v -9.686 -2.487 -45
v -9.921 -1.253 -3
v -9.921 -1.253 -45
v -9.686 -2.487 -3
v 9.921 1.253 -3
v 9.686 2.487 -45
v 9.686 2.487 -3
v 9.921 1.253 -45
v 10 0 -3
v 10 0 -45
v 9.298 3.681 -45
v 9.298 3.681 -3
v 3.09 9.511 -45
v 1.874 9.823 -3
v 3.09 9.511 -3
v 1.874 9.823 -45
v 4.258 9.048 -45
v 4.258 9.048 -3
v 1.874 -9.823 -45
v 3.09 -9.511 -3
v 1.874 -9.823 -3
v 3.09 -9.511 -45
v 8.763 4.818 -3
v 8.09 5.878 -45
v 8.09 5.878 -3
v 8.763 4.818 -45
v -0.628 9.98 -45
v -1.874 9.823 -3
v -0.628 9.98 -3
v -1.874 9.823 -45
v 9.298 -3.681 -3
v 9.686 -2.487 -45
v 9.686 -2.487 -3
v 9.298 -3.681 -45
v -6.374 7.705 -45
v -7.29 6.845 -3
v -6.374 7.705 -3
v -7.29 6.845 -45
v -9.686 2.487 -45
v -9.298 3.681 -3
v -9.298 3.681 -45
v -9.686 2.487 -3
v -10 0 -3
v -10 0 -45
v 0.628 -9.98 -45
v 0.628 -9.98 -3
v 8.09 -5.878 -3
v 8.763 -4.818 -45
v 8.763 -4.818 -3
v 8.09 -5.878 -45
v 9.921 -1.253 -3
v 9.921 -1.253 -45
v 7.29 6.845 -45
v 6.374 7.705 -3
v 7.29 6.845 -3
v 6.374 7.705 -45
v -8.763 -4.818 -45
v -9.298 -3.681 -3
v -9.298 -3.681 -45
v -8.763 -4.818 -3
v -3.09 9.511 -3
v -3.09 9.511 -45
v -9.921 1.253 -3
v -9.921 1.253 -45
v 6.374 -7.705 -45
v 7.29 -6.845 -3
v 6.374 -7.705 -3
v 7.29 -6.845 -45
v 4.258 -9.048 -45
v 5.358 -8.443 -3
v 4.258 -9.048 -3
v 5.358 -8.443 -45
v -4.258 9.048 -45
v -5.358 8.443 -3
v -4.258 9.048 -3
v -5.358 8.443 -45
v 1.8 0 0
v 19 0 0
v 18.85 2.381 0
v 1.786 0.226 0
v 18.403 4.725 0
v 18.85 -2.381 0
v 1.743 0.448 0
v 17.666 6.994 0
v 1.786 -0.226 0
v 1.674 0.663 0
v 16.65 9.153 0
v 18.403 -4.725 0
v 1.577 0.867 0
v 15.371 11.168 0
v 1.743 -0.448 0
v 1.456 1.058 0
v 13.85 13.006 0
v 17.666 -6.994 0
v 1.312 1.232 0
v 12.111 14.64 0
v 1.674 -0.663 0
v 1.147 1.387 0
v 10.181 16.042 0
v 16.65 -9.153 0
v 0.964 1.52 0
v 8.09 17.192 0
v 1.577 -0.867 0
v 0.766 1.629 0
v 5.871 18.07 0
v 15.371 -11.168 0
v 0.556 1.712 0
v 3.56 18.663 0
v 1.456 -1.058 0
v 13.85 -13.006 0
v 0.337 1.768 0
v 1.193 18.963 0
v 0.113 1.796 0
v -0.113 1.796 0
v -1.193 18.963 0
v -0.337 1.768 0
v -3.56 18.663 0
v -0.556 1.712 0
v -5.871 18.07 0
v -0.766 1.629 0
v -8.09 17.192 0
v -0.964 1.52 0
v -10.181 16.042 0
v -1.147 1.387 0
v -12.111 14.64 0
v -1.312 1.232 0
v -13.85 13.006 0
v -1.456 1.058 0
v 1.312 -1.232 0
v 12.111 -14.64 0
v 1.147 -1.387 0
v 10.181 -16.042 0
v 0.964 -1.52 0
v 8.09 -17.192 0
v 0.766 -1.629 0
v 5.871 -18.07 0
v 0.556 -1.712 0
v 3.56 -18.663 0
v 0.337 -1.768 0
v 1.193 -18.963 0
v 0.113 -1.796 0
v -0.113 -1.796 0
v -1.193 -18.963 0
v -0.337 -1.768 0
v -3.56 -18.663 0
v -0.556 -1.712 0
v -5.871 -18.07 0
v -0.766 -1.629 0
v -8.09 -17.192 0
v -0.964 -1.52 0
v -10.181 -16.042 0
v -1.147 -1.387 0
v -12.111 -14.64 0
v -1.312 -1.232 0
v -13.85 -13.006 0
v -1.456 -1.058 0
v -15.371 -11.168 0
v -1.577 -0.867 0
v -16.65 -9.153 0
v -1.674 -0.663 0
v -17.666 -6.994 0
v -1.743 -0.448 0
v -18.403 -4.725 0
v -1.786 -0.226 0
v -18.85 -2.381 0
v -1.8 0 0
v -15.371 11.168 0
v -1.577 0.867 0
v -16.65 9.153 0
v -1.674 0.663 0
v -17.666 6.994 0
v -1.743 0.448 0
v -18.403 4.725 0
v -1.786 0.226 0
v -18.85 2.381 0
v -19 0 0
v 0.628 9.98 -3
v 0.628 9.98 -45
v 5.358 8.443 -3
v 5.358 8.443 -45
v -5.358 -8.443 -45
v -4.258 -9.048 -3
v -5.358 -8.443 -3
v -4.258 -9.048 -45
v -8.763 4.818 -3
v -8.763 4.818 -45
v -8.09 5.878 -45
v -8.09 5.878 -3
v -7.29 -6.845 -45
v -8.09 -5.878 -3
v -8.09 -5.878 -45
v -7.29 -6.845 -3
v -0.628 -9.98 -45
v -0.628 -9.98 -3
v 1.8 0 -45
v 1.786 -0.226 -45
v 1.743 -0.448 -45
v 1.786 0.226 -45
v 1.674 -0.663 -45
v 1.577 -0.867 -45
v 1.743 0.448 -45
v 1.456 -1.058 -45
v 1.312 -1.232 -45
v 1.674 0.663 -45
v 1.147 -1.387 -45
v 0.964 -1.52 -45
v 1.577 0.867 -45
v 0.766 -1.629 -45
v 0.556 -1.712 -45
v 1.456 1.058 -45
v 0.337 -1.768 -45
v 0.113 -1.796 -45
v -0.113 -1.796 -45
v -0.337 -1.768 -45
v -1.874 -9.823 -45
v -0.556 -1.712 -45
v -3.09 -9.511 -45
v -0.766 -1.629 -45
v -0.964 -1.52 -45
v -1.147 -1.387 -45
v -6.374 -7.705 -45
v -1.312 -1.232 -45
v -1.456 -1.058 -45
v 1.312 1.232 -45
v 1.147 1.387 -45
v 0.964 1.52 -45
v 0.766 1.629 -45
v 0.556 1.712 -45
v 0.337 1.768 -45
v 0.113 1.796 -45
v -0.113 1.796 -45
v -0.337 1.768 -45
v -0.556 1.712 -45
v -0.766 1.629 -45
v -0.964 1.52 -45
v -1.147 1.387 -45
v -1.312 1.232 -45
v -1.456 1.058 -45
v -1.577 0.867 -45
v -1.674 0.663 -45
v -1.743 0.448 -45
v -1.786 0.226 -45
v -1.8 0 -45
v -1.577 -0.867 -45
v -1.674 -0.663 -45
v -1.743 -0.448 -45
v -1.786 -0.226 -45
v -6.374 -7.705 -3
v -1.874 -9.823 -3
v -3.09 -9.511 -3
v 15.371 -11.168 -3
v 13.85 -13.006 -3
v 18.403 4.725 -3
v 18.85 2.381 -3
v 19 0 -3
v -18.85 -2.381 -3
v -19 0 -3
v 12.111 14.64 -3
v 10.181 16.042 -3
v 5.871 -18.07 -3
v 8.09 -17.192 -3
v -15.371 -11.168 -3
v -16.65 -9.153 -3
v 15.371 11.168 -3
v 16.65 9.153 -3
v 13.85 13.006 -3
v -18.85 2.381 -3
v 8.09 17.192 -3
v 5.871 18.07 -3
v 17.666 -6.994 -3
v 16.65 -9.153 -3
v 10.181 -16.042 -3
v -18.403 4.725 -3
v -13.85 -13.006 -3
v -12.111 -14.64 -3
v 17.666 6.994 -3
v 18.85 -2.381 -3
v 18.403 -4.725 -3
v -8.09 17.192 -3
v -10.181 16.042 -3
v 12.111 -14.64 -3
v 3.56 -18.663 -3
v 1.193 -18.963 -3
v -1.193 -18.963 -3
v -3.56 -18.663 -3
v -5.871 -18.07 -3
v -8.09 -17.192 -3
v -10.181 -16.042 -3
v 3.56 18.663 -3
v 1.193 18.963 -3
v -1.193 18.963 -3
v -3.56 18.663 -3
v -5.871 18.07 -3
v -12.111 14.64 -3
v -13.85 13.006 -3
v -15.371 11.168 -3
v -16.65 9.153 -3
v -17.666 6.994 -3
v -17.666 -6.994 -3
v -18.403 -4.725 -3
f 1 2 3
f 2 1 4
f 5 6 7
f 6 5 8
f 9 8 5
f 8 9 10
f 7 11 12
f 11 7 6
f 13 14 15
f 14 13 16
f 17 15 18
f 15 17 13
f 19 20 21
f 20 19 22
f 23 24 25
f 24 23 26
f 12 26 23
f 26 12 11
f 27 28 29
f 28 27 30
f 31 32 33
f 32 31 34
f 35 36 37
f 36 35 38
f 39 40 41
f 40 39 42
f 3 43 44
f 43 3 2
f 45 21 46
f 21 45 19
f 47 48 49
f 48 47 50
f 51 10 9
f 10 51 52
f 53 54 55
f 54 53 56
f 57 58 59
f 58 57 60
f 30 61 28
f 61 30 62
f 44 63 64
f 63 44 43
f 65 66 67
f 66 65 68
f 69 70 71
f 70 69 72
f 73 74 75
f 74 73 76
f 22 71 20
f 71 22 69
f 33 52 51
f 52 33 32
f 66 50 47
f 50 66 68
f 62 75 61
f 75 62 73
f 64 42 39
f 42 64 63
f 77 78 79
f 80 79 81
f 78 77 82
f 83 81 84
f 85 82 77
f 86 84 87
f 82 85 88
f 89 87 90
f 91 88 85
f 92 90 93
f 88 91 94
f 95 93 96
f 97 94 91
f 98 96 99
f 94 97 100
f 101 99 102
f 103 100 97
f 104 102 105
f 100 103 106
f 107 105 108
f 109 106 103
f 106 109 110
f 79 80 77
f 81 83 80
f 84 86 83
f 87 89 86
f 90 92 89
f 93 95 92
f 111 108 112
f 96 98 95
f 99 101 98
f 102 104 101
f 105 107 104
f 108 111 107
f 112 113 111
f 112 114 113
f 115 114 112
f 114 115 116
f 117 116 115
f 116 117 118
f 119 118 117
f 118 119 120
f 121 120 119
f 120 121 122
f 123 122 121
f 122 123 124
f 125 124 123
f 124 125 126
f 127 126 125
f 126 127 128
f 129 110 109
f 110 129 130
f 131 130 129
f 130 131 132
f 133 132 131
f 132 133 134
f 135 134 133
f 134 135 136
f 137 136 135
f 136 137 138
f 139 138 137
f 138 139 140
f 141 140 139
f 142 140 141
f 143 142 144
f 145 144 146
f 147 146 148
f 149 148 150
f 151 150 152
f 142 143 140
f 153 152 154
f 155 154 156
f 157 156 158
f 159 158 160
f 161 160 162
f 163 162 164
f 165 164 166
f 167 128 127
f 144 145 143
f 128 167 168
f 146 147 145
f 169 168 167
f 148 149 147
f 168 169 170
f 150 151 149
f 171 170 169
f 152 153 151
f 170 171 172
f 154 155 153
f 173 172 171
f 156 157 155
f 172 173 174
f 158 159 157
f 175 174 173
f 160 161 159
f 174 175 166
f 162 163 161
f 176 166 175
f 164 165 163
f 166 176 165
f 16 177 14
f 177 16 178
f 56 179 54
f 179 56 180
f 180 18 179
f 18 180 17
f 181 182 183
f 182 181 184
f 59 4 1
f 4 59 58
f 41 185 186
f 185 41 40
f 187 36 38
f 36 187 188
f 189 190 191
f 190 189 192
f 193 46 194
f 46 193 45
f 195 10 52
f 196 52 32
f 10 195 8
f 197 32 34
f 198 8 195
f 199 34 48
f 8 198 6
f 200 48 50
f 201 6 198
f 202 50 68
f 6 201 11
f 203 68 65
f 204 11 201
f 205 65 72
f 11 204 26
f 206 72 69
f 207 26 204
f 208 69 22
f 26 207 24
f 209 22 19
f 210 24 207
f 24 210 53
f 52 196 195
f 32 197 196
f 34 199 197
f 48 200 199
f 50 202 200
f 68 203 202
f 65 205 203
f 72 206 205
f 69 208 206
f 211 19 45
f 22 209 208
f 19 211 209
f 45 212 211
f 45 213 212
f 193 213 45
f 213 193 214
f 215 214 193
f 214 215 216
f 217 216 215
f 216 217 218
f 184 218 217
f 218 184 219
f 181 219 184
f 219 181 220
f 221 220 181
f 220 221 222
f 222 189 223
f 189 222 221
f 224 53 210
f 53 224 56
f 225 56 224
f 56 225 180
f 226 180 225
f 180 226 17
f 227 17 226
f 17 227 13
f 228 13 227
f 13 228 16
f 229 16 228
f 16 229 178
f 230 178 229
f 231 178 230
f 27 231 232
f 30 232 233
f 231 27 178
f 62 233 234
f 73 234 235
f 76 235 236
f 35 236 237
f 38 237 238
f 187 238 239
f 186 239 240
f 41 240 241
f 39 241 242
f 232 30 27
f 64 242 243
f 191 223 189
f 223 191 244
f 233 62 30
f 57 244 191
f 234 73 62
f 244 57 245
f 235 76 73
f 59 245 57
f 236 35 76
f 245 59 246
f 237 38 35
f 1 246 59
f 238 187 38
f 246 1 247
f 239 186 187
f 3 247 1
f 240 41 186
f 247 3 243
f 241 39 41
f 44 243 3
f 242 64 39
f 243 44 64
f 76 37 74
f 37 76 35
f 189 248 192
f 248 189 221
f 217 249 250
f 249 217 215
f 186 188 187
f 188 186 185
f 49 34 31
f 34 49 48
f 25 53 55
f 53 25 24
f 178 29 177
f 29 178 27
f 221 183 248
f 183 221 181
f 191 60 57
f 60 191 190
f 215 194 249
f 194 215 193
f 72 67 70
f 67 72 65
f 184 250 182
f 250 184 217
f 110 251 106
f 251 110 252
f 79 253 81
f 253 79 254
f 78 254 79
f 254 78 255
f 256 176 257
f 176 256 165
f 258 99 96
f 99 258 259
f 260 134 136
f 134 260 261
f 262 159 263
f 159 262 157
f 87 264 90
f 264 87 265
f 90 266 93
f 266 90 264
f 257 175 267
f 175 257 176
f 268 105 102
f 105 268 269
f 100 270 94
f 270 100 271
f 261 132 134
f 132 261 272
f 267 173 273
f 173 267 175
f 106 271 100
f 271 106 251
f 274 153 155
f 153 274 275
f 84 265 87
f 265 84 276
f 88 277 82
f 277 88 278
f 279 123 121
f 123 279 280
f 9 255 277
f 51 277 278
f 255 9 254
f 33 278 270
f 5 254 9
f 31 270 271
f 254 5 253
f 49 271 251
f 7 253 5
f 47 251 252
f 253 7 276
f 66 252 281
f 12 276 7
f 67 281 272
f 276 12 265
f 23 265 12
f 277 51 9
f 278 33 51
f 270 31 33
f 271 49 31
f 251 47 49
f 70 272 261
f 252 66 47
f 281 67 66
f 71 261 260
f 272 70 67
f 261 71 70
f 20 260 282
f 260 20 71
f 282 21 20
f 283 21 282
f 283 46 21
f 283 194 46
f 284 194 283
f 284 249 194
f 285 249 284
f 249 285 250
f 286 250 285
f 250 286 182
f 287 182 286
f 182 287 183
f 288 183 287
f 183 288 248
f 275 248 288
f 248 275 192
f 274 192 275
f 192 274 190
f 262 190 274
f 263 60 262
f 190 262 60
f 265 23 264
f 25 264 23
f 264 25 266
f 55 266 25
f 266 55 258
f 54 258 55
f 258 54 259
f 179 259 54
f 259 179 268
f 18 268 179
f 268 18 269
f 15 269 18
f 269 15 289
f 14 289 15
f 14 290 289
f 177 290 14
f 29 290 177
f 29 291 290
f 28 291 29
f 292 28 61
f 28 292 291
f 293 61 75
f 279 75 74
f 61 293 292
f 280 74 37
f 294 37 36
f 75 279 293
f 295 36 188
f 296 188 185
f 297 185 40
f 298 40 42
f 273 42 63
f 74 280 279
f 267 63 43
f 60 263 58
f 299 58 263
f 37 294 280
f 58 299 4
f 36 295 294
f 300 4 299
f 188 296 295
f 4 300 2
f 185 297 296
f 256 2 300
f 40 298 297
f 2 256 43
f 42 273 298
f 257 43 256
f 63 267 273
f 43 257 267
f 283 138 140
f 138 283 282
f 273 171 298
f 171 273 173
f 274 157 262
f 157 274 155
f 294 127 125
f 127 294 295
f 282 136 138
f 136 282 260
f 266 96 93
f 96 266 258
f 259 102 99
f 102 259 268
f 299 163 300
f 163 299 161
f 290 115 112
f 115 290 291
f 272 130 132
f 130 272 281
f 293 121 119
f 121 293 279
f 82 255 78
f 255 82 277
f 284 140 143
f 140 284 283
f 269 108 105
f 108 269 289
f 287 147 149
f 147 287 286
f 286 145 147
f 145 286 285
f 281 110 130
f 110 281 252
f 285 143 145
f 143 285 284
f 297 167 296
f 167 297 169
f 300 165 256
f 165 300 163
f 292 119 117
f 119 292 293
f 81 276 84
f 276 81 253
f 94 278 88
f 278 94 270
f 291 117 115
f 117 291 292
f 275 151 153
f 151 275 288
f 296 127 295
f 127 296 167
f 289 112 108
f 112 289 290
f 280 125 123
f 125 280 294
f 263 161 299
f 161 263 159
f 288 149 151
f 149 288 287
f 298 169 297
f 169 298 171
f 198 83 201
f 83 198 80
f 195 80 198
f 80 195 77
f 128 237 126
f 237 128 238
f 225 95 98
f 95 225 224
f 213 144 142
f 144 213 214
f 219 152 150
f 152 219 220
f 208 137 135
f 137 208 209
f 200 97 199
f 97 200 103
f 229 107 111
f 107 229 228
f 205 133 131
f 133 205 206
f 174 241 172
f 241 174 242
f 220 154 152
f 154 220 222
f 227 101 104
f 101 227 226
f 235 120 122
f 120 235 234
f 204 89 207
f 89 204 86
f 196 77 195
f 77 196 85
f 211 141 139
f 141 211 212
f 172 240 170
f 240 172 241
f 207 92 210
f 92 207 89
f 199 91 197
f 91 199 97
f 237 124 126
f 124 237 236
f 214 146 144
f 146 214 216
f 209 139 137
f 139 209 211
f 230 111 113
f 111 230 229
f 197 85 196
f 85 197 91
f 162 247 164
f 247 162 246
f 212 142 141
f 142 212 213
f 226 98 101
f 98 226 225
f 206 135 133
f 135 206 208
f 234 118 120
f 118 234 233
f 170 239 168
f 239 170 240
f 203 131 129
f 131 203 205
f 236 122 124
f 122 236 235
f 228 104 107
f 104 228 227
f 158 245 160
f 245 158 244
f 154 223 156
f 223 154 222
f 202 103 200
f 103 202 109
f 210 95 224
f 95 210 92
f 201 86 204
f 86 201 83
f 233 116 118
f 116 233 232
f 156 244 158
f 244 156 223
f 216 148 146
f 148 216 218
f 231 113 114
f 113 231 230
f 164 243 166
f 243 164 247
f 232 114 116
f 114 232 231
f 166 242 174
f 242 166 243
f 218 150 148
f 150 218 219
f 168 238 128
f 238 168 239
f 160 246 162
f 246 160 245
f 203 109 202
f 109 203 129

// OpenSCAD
$fn = 50;


difference() {
	union() {
		translate(v = [0, 0, -45.0000000000]) {
			cylinder(h = 45, r = 10.0000000000);
		}
		translate(v = [0, 0, -3.0000000000]) {
			cylinder(h = 3, r = 19.0000000000);
		}
	}
	union() {
		#translate(v = [0, 0, -45]) {
			cylinder(h = 45, r = 1.8000000000);
		}
	}
}
